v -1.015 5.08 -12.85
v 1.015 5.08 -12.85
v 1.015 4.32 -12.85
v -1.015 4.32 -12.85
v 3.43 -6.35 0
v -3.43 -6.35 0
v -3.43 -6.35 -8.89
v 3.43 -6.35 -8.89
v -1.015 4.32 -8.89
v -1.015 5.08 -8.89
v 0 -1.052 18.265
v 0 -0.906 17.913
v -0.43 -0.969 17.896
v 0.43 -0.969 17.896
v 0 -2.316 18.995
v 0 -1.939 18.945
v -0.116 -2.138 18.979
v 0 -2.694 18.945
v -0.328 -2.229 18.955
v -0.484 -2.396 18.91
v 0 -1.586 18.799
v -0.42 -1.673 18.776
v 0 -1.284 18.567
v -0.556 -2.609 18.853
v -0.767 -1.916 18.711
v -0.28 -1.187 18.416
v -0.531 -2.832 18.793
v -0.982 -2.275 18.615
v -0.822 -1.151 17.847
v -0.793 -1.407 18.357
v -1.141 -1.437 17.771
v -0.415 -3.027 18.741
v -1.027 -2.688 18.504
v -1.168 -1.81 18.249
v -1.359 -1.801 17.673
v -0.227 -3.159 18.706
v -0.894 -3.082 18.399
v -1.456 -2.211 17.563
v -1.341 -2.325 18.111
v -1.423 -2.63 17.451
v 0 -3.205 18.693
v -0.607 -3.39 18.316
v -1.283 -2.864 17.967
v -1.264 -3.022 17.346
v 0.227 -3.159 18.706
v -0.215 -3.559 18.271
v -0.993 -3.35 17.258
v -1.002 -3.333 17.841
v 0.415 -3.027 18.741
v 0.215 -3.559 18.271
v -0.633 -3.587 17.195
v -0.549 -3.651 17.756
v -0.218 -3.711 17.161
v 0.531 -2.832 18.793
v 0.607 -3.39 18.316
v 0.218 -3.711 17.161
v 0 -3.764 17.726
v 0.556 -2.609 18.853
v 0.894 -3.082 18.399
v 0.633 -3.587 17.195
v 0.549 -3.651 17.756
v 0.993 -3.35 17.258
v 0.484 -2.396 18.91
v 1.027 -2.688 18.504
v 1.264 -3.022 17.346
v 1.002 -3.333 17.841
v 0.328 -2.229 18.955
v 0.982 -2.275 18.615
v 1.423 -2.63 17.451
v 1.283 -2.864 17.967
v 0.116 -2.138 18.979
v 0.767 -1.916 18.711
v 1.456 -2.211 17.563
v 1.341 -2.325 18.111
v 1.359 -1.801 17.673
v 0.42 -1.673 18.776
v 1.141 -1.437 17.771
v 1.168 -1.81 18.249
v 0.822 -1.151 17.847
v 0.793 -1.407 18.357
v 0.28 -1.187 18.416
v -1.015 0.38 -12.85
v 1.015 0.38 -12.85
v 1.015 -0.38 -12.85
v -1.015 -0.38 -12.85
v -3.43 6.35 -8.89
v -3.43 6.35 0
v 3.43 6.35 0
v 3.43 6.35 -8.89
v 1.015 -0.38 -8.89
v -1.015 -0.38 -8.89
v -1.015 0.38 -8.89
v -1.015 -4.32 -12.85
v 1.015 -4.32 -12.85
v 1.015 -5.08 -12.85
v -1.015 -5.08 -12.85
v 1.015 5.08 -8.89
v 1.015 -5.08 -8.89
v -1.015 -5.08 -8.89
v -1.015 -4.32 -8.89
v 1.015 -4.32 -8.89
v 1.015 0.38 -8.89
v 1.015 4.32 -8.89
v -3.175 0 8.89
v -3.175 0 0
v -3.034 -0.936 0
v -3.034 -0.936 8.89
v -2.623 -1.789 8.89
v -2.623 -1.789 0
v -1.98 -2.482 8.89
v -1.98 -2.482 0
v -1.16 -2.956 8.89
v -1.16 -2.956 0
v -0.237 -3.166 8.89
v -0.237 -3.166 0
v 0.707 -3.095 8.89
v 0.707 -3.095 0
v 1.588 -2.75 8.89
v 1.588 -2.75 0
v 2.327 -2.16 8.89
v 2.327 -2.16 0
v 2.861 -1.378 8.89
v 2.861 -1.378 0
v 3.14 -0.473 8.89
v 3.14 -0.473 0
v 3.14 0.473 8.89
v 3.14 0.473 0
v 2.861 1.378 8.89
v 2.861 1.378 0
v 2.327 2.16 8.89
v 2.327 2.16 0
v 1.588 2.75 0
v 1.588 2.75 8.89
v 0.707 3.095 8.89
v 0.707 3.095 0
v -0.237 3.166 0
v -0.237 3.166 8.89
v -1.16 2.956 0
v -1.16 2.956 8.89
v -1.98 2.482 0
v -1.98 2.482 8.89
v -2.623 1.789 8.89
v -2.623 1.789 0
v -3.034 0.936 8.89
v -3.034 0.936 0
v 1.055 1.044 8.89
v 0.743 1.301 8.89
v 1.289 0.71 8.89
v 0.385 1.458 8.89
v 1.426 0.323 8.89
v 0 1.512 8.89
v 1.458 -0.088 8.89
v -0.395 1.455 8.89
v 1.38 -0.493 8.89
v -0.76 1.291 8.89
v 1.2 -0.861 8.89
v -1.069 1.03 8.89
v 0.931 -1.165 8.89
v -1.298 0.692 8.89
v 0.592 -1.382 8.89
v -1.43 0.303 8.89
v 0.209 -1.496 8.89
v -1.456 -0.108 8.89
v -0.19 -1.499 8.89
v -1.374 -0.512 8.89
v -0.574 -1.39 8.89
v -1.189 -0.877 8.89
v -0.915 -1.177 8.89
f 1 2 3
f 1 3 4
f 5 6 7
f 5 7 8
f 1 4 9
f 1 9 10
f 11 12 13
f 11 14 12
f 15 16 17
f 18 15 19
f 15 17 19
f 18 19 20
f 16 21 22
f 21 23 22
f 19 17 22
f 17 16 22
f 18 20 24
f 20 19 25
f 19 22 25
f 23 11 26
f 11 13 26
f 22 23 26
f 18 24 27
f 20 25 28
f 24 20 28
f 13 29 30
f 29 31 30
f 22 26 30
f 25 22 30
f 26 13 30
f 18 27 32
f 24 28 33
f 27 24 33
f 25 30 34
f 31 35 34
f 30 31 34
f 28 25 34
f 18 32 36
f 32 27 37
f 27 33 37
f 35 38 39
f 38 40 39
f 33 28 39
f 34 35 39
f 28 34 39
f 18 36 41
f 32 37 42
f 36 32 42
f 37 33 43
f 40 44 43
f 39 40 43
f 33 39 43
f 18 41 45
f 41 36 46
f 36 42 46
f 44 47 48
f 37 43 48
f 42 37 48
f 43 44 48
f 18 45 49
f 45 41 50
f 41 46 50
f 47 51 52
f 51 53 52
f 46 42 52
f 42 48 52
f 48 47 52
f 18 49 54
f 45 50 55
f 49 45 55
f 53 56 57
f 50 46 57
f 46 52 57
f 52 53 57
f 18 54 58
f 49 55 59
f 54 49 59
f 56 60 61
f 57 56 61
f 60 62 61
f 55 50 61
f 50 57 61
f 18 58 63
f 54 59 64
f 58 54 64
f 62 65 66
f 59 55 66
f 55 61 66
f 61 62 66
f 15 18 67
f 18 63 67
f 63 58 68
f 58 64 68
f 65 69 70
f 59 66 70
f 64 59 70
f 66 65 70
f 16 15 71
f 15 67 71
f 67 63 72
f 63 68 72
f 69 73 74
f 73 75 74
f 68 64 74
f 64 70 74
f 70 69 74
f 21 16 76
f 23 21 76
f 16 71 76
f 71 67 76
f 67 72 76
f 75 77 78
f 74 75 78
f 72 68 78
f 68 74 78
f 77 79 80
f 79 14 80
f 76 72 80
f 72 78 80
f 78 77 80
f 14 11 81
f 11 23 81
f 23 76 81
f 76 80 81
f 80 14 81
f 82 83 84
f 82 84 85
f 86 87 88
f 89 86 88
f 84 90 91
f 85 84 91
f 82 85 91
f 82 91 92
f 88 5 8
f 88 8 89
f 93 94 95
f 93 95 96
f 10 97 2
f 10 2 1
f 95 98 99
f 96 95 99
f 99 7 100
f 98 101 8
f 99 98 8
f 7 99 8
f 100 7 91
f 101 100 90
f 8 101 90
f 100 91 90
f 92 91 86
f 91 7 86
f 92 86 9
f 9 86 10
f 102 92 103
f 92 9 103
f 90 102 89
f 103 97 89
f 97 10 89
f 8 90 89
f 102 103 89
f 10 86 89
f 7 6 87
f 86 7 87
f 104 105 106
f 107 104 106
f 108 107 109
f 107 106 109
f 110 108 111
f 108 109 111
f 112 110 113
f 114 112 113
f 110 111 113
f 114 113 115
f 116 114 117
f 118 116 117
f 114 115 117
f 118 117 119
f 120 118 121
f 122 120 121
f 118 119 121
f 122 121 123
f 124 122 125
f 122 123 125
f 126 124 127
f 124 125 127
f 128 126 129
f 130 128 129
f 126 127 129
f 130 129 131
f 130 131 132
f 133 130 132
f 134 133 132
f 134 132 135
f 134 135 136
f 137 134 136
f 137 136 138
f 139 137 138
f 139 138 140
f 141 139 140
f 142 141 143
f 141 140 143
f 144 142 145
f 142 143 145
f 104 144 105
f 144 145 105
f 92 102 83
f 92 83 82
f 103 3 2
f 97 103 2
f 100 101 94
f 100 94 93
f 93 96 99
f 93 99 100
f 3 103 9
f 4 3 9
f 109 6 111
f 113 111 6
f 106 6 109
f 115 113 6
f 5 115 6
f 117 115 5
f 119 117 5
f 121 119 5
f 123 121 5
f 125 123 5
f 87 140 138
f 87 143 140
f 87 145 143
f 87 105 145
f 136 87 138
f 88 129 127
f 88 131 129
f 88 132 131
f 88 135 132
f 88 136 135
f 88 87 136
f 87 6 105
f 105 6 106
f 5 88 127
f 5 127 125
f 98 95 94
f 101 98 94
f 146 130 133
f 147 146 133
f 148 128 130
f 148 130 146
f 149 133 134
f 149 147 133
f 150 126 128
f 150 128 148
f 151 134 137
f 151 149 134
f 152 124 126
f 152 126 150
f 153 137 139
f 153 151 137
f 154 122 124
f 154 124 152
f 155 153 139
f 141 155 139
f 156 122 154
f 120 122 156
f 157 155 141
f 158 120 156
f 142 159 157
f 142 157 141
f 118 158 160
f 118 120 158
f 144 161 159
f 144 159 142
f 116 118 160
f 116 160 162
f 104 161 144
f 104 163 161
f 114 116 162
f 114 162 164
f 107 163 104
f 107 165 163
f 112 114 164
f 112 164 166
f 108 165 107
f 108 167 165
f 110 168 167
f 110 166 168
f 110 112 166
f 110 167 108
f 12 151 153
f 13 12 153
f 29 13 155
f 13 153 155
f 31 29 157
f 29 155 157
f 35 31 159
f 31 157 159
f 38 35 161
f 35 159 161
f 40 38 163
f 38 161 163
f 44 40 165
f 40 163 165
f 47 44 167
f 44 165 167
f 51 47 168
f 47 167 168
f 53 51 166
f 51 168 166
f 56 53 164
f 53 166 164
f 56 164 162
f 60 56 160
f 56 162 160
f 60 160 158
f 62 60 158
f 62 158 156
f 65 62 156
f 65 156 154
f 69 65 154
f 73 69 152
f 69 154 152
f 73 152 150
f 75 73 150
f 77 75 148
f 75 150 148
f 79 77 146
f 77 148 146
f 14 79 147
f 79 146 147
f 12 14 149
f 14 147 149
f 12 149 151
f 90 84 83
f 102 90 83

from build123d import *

# Parameters (mm, degrees)
ESQUISSE1_W        = 6.86
ESQUISSE1_H        = 12.7
BOSS_EXTRU_1_DEPTH = 8.89
ESQUISSE2_R        = 3.175
BOSS_EXTRU_2_DEPTH = 8.89
ESQUISSE4_W        = 2.03
ESQUISSE4_H        = 0.76
BOSS_EXTRU_3_DEPTH = 3.96


with BuildPart() as part:
    # Esquisse1 → Boss.-Extru.1 (new body)
    with BuildSketch(Plane.XY):
        Rectangle(ESQUISSE1_W, ESQUISSE1_H)
    extrude(amount=-BOSS_EXTRU_1_DEPTH)

    # Esquisse2 → Boss.-Extru.2 (add)
    with BuildSketch(Plane.XY):
        with Locations(Location((0, 0, 0), (0, 0, 180))):
            Circle(ESQUISSE2_R)
    extrude(amount=BOSS_EXTRU_2_DEPTH)

    # Esquisse3 → Révolution1 (revolve)
    with BuildSketch(Plane(origin=(0, 0, 0), x_dir=(0, 0, -1), z_dir=(1, 0, 0))):
        with BuildLine():
            Line((-17.912911951, -0.906178747), (-8.89, 1.511503223))
            Line((-8.89, 1.511503223), (-8.512124194, 0.101251517))
            Line((-8.512124194, 0.101251517), (-18.945287852, -2.69430626))
            ThreePointArc((-18.945287852, -2.69430626), (-18.799433235, -1.586430454), (-17.912911951, -0.906178747))
        make_face()
    revolve(axis=Axis((0, 0, 8.89), (0, -0.2588190451025216, 0.9659258262890681)))

    # Esquisse4 → Boss.-Extru.3 (add)
    with BuildSketch(Plane(origin=(0, 0, -8.89), x_dir=(-1, 0, 0), z_dir=(0, 0, -1))):
        Rectangle(ESQUISSE4_W, ESQUISSE4_H)
        with Locations((0, 4.7)):
            Rectangle(ESQUISSE4_W, ESQUISSE4_H)
        with Locations((0, -4.7)):
            Rectangle(ESQUISSE4_W, ESQUISSE4_H)
    extrude(amount=BOSS_EXTRU_3_DEPTH)


solid = part.part
